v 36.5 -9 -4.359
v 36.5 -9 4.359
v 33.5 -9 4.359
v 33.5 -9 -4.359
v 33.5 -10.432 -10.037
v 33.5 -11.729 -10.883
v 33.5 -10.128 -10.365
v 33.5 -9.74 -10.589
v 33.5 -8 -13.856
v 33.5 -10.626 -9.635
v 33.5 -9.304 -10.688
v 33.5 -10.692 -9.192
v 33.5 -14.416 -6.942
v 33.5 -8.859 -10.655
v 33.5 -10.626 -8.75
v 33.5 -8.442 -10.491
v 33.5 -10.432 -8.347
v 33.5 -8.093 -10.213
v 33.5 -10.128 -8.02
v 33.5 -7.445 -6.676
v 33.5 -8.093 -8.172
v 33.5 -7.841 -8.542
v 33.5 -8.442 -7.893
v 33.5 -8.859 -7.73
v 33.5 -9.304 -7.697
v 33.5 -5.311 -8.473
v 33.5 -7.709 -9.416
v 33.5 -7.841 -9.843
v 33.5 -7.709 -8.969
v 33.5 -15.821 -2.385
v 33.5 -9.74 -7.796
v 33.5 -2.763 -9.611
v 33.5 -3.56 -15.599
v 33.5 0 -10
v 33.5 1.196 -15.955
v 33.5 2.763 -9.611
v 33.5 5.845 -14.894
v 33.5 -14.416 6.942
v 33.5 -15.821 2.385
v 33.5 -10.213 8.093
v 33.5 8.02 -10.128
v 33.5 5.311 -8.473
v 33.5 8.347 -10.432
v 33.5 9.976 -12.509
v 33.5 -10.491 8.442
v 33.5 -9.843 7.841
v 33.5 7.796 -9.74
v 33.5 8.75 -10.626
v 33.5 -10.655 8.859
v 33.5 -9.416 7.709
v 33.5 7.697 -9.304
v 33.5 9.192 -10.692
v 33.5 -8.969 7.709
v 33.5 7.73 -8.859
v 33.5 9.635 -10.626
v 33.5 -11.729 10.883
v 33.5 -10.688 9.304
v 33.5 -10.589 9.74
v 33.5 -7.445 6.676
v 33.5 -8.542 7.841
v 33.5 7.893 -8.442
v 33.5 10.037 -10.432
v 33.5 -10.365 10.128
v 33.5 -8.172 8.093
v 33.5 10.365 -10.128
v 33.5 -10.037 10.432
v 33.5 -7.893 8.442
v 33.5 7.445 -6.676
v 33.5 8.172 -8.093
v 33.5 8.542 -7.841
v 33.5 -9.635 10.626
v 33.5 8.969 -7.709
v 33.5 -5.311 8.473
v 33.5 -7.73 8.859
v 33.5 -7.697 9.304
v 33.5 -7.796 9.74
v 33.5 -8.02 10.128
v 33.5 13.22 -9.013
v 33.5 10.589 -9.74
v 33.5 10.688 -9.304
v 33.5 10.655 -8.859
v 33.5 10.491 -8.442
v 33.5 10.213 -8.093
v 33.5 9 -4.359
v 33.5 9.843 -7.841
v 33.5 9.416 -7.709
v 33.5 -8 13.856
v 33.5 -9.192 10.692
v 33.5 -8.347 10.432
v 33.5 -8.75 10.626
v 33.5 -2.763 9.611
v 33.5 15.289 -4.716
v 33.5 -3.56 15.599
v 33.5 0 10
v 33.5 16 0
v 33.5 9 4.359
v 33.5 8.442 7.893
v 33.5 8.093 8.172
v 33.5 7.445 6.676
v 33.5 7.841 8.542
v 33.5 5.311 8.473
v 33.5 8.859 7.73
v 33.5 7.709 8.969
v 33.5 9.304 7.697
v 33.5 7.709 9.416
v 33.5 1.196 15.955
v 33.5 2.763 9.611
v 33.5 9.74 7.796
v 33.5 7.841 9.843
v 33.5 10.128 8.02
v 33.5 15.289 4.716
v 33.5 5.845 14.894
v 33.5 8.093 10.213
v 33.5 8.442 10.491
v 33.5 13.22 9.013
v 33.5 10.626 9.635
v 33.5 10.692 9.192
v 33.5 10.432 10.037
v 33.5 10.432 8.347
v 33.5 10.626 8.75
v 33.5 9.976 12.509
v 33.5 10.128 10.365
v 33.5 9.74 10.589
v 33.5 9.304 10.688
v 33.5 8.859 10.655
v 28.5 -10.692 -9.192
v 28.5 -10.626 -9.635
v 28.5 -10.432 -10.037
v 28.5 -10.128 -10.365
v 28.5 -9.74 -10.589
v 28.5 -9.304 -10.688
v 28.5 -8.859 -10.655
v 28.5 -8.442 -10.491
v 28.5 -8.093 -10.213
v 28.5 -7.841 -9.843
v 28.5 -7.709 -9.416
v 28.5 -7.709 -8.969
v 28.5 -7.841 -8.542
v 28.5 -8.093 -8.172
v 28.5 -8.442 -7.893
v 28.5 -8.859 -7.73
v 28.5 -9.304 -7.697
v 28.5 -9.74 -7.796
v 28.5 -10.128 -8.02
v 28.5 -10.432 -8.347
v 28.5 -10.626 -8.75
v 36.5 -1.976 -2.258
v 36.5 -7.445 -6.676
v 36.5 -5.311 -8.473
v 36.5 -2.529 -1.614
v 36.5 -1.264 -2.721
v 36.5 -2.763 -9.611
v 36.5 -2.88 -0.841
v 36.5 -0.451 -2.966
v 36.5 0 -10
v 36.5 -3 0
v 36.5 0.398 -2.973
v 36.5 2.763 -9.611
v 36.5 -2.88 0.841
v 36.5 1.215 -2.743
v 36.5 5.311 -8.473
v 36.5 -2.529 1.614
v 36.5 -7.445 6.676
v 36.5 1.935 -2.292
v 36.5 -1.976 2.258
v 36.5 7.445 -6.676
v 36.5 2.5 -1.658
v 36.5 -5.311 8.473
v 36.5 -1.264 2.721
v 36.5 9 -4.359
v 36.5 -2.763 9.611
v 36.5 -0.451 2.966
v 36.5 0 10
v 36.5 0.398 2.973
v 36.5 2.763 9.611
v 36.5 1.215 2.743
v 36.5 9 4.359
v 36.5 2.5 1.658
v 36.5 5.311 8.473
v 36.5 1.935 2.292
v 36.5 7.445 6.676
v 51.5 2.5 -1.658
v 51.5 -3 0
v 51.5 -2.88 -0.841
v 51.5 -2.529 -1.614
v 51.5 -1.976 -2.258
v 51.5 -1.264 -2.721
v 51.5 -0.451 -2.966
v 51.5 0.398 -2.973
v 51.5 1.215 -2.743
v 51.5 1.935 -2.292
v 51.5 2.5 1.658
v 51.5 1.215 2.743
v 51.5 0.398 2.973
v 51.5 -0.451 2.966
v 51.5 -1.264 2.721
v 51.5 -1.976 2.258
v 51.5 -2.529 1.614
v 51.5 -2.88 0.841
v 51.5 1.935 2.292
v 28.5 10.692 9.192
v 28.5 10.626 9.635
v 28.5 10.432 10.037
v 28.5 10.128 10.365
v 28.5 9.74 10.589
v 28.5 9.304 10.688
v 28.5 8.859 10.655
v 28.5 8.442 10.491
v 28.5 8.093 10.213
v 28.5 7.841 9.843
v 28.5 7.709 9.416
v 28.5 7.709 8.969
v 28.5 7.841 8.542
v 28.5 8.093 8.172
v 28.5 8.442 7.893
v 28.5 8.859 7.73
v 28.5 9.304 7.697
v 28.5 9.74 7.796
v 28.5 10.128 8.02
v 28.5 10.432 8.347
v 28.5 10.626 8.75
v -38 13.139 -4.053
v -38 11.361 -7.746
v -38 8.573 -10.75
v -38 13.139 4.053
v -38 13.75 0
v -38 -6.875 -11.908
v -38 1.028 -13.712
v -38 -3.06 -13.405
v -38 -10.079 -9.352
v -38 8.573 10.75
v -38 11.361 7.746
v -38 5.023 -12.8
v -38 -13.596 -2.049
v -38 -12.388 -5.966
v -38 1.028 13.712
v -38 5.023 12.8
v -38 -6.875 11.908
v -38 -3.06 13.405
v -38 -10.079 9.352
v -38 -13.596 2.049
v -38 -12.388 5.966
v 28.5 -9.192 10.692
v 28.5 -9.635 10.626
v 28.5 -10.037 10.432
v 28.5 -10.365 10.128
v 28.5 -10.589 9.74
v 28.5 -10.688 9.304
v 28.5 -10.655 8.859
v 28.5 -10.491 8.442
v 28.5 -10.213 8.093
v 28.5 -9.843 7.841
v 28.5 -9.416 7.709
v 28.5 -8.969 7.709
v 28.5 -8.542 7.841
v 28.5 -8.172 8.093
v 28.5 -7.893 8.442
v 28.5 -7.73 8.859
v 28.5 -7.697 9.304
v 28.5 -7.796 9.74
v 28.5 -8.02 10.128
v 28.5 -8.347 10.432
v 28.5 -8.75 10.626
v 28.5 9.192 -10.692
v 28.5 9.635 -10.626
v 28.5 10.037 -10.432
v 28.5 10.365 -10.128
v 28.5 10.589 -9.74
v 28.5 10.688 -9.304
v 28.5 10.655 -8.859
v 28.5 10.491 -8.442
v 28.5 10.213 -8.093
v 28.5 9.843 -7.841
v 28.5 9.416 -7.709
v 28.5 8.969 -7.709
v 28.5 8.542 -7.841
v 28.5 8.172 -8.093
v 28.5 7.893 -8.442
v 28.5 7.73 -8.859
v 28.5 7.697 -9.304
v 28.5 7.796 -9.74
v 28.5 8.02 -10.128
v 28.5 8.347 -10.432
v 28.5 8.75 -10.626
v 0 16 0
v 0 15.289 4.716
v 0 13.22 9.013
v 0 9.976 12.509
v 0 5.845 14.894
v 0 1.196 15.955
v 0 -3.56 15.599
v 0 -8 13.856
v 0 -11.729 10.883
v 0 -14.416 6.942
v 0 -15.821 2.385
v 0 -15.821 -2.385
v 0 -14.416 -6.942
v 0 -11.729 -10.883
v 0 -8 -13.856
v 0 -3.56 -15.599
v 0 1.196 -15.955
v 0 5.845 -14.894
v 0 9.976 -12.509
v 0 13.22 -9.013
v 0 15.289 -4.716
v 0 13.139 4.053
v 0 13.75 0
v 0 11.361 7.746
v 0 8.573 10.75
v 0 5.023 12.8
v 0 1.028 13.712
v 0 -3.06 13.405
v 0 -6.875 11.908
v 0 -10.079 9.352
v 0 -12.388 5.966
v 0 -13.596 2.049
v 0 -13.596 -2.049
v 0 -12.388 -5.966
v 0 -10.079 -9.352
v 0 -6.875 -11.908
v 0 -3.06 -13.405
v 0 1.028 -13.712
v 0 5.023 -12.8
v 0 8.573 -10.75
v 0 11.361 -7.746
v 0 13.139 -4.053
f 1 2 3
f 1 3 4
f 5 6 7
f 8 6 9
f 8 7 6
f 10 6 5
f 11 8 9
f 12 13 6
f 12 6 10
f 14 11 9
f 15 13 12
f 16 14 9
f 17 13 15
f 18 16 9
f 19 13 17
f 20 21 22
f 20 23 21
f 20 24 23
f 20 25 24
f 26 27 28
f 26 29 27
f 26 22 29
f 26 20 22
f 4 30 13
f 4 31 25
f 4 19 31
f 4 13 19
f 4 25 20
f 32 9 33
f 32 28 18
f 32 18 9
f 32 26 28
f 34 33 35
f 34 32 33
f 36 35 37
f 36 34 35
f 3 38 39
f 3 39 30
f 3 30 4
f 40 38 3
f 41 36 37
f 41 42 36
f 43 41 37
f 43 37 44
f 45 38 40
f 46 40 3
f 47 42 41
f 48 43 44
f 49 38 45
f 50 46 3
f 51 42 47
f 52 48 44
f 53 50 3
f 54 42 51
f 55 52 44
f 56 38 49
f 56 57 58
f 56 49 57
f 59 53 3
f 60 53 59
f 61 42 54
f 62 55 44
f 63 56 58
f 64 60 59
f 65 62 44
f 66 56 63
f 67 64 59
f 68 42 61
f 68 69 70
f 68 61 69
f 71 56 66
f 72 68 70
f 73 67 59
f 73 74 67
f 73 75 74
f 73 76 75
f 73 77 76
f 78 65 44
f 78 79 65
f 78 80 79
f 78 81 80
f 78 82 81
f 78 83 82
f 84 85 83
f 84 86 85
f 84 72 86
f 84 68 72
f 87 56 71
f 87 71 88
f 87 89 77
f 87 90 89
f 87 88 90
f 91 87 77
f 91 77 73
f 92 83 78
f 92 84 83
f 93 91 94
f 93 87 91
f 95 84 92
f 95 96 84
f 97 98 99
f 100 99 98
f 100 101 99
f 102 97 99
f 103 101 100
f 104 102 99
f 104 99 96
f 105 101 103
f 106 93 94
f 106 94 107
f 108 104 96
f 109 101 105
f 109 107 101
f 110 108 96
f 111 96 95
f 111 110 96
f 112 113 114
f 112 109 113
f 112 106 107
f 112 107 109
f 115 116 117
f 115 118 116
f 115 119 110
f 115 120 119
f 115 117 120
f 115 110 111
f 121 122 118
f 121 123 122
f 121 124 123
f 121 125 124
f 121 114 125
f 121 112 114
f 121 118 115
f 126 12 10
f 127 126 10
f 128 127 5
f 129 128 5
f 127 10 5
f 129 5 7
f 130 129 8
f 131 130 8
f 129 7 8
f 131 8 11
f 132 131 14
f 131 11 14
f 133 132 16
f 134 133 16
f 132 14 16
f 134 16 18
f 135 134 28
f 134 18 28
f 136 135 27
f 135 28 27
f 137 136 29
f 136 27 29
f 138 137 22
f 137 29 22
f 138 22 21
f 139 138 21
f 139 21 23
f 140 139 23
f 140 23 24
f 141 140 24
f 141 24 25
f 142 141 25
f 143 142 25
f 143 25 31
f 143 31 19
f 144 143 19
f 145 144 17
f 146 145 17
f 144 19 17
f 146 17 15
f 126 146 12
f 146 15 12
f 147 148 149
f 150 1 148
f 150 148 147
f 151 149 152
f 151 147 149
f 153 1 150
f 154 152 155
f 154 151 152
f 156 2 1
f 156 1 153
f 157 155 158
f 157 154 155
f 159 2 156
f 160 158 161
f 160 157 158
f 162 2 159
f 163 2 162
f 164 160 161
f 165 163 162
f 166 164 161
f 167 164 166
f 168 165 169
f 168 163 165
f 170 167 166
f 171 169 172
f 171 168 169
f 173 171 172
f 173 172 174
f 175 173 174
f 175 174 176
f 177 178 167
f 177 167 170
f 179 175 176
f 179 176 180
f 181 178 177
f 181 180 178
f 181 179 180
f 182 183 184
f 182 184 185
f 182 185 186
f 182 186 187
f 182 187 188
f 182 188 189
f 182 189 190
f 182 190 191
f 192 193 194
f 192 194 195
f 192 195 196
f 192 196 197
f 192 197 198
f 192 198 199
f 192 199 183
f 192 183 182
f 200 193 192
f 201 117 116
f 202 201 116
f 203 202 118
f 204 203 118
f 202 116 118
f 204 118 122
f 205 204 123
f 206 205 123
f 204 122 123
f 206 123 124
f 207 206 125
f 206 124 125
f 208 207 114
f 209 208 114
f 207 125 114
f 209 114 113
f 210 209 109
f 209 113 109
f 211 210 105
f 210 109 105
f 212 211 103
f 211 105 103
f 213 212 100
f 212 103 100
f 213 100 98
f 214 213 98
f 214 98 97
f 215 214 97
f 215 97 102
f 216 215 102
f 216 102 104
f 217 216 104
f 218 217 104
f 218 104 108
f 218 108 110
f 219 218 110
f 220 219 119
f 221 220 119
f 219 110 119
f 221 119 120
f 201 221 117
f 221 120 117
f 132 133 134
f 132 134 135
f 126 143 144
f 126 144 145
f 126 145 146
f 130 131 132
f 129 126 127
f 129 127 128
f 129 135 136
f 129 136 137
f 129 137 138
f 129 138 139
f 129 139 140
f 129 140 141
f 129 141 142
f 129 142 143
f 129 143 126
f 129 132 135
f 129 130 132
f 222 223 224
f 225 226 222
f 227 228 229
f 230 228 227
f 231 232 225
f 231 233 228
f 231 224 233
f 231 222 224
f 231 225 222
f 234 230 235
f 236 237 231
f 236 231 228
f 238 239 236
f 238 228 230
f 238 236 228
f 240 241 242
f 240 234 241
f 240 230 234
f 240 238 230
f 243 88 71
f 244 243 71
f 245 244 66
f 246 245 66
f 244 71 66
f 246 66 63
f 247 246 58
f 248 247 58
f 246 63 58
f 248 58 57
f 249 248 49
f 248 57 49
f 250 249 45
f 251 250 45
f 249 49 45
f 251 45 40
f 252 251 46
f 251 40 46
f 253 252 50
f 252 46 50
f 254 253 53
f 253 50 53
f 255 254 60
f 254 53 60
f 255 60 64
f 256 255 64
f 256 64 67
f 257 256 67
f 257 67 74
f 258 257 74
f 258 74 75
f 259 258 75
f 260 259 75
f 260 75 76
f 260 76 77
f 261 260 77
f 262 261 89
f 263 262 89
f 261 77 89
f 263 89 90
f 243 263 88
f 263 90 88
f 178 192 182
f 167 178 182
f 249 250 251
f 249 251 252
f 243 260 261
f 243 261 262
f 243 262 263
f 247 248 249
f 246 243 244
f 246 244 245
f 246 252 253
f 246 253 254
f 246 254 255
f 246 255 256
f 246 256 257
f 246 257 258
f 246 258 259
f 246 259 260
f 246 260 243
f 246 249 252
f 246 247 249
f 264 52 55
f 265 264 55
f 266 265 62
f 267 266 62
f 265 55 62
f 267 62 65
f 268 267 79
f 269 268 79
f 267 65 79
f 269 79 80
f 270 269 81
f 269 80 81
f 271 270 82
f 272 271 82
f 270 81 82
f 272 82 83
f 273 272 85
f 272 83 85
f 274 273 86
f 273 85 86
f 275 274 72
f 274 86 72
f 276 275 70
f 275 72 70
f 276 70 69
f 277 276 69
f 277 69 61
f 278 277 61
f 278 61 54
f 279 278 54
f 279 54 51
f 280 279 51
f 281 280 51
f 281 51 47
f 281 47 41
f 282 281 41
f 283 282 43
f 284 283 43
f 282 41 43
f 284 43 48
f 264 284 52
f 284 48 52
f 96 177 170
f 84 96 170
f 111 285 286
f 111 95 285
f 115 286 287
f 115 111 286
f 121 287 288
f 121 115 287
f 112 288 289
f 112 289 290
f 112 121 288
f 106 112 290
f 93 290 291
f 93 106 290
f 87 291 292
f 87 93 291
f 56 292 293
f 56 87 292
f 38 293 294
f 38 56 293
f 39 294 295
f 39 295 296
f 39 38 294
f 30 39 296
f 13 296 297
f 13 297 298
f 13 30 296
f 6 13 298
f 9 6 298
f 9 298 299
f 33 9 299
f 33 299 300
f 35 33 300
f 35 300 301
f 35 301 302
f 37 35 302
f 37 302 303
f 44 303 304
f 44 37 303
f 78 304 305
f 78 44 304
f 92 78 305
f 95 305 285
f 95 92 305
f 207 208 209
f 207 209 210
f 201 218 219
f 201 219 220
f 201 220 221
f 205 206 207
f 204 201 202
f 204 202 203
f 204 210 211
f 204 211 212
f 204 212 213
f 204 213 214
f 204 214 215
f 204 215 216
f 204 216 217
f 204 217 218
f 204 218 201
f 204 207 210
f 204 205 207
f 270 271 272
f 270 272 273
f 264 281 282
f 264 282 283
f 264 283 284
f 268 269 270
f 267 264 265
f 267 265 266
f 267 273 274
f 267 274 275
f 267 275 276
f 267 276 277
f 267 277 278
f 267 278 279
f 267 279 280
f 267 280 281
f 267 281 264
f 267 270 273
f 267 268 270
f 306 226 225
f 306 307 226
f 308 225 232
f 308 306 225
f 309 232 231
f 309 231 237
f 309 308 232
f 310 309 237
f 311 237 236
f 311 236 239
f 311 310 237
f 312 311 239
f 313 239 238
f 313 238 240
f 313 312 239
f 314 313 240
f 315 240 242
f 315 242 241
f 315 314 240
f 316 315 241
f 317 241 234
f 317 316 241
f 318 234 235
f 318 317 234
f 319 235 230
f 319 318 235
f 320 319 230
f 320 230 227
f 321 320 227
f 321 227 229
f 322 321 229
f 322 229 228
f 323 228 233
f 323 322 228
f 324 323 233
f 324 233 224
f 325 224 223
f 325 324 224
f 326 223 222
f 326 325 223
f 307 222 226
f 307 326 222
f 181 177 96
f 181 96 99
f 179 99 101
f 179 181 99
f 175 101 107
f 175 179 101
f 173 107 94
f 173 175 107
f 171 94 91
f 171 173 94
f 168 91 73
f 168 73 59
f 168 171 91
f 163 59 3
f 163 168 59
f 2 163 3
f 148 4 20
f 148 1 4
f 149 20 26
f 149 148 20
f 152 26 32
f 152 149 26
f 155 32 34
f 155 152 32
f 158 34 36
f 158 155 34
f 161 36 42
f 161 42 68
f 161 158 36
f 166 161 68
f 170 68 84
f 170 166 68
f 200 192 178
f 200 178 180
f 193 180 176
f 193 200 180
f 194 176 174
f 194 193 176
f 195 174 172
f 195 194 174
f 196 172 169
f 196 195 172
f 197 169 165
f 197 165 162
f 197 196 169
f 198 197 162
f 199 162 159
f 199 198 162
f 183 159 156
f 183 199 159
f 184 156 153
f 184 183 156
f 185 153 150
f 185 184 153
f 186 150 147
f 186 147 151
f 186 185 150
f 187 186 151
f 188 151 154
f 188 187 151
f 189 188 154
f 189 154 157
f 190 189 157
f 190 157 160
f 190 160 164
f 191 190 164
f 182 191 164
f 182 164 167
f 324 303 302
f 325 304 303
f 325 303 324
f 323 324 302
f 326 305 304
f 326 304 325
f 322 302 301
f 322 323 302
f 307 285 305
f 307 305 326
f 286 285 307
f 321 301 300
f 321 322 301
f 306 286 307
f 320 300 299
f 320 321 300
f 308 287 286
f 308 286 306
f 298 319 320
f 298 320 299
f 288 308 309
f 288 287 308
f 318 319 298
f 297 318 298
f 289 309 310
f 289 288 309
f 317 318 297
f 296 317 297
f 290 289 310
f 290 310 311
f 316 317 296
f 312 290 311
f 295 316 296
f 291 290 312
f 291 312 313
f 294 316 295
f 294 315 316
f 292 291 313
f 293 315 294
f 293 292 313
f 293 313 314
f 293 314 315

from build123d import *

# Parameters (mm, degrees)
MEPLATFIXING_DEPTH                 = 3
MEPLATROTOR_DEPTH                  = 15
ESQUISSE4_R                        = 1.5
FIXINGHOLE_DEPTH                   = 5
FIXINGHOLECIRCULARREPETITION_COUNT = 4


with BuildPart() as part:
    # Esquisse1 → Révolution1 (revolve)
    with BuildSketch(Plane.XY):
        Polygon((-38, 13.75), (0, 13.75), (0, 16), (33.5, 16), (33.5, 10), (36.5, 10), (36.5, 3), (51.5, 3), (51.5, 0), (-38, 0), align=None)
    revolve(axis=Axis((-42.475, 0, 0), (1, 0, 0)))

    # Esquisse2 → MeplatFixing (cut)
    with BuildSketch(Plane(origin=(36.5, 0, 0), x_dir=(0, 0, -1), z_dir=(1, 0, 0))):
        with BuildLine():
            Line((-4.358898944, 9), (4.358898944, 9))
            ThreePointArc((4.358898944, 9), (0, 10), (-4.358898944, 9))
        make_face()
        with BuildLine():
            Line((-4.358898944, -9), (4.358898944, -9))
            ThreePointArc((4.358898944, -9), (0, -10), (-4.358898944, -9))
        make_face()
    extrude(amount=-MEPLATFIXING_DEPTH, mode=Mode.SUBTRACT)

    # Esquisse3 → MeplatRotor (cut)
    with BuildSketch(Plane(origin=(51.5, 0, 0), x_dir=(0, 0, -1), z_dir=(1, 0, 0))):
        with BuildLine():
            Line((-1.658312395, 2.5), (1.658312395, 2.5))
            ThreePointArc((1.658312395, 2.5), (0, 3), (-1.658312395, 2.5))
        make_face()
    extrude(amount=-MEPLATROTOR_DEPTH, mode=Mode.SUBTRACT)

    # Esquisse4 → FixingHole (cut)
    with BuildSketch(Plane(origin=(33.5, 0, 0), x_dir=(0, 0, -1), z_dir=(1, 0, 0))):
        with Locations((9.192388155, 9.192388155)):
            Circle(ESQUISSE4_R)
    fixinghole = extrude(amount=-FIXINGHOLE_DEPTH, mode=Mode.SUBTRACT)

    # FixingHoleCircularRepetition: FixingHole ×4 about axis
    fixingholecircularrepetition_axis = Axis((0, 0, 0), (1, 0, 0))
    for i in range(1, FIXINGHOLECIRCULARREPETITION_COUNT):
        add(fixinghole.rotate(fixingholecircularrepetition_axis, i * 360 / FIXINGHOLECIRCULARREPETITION_COUNT), mode=Mode.SUBTRACT)


solid = part.part
